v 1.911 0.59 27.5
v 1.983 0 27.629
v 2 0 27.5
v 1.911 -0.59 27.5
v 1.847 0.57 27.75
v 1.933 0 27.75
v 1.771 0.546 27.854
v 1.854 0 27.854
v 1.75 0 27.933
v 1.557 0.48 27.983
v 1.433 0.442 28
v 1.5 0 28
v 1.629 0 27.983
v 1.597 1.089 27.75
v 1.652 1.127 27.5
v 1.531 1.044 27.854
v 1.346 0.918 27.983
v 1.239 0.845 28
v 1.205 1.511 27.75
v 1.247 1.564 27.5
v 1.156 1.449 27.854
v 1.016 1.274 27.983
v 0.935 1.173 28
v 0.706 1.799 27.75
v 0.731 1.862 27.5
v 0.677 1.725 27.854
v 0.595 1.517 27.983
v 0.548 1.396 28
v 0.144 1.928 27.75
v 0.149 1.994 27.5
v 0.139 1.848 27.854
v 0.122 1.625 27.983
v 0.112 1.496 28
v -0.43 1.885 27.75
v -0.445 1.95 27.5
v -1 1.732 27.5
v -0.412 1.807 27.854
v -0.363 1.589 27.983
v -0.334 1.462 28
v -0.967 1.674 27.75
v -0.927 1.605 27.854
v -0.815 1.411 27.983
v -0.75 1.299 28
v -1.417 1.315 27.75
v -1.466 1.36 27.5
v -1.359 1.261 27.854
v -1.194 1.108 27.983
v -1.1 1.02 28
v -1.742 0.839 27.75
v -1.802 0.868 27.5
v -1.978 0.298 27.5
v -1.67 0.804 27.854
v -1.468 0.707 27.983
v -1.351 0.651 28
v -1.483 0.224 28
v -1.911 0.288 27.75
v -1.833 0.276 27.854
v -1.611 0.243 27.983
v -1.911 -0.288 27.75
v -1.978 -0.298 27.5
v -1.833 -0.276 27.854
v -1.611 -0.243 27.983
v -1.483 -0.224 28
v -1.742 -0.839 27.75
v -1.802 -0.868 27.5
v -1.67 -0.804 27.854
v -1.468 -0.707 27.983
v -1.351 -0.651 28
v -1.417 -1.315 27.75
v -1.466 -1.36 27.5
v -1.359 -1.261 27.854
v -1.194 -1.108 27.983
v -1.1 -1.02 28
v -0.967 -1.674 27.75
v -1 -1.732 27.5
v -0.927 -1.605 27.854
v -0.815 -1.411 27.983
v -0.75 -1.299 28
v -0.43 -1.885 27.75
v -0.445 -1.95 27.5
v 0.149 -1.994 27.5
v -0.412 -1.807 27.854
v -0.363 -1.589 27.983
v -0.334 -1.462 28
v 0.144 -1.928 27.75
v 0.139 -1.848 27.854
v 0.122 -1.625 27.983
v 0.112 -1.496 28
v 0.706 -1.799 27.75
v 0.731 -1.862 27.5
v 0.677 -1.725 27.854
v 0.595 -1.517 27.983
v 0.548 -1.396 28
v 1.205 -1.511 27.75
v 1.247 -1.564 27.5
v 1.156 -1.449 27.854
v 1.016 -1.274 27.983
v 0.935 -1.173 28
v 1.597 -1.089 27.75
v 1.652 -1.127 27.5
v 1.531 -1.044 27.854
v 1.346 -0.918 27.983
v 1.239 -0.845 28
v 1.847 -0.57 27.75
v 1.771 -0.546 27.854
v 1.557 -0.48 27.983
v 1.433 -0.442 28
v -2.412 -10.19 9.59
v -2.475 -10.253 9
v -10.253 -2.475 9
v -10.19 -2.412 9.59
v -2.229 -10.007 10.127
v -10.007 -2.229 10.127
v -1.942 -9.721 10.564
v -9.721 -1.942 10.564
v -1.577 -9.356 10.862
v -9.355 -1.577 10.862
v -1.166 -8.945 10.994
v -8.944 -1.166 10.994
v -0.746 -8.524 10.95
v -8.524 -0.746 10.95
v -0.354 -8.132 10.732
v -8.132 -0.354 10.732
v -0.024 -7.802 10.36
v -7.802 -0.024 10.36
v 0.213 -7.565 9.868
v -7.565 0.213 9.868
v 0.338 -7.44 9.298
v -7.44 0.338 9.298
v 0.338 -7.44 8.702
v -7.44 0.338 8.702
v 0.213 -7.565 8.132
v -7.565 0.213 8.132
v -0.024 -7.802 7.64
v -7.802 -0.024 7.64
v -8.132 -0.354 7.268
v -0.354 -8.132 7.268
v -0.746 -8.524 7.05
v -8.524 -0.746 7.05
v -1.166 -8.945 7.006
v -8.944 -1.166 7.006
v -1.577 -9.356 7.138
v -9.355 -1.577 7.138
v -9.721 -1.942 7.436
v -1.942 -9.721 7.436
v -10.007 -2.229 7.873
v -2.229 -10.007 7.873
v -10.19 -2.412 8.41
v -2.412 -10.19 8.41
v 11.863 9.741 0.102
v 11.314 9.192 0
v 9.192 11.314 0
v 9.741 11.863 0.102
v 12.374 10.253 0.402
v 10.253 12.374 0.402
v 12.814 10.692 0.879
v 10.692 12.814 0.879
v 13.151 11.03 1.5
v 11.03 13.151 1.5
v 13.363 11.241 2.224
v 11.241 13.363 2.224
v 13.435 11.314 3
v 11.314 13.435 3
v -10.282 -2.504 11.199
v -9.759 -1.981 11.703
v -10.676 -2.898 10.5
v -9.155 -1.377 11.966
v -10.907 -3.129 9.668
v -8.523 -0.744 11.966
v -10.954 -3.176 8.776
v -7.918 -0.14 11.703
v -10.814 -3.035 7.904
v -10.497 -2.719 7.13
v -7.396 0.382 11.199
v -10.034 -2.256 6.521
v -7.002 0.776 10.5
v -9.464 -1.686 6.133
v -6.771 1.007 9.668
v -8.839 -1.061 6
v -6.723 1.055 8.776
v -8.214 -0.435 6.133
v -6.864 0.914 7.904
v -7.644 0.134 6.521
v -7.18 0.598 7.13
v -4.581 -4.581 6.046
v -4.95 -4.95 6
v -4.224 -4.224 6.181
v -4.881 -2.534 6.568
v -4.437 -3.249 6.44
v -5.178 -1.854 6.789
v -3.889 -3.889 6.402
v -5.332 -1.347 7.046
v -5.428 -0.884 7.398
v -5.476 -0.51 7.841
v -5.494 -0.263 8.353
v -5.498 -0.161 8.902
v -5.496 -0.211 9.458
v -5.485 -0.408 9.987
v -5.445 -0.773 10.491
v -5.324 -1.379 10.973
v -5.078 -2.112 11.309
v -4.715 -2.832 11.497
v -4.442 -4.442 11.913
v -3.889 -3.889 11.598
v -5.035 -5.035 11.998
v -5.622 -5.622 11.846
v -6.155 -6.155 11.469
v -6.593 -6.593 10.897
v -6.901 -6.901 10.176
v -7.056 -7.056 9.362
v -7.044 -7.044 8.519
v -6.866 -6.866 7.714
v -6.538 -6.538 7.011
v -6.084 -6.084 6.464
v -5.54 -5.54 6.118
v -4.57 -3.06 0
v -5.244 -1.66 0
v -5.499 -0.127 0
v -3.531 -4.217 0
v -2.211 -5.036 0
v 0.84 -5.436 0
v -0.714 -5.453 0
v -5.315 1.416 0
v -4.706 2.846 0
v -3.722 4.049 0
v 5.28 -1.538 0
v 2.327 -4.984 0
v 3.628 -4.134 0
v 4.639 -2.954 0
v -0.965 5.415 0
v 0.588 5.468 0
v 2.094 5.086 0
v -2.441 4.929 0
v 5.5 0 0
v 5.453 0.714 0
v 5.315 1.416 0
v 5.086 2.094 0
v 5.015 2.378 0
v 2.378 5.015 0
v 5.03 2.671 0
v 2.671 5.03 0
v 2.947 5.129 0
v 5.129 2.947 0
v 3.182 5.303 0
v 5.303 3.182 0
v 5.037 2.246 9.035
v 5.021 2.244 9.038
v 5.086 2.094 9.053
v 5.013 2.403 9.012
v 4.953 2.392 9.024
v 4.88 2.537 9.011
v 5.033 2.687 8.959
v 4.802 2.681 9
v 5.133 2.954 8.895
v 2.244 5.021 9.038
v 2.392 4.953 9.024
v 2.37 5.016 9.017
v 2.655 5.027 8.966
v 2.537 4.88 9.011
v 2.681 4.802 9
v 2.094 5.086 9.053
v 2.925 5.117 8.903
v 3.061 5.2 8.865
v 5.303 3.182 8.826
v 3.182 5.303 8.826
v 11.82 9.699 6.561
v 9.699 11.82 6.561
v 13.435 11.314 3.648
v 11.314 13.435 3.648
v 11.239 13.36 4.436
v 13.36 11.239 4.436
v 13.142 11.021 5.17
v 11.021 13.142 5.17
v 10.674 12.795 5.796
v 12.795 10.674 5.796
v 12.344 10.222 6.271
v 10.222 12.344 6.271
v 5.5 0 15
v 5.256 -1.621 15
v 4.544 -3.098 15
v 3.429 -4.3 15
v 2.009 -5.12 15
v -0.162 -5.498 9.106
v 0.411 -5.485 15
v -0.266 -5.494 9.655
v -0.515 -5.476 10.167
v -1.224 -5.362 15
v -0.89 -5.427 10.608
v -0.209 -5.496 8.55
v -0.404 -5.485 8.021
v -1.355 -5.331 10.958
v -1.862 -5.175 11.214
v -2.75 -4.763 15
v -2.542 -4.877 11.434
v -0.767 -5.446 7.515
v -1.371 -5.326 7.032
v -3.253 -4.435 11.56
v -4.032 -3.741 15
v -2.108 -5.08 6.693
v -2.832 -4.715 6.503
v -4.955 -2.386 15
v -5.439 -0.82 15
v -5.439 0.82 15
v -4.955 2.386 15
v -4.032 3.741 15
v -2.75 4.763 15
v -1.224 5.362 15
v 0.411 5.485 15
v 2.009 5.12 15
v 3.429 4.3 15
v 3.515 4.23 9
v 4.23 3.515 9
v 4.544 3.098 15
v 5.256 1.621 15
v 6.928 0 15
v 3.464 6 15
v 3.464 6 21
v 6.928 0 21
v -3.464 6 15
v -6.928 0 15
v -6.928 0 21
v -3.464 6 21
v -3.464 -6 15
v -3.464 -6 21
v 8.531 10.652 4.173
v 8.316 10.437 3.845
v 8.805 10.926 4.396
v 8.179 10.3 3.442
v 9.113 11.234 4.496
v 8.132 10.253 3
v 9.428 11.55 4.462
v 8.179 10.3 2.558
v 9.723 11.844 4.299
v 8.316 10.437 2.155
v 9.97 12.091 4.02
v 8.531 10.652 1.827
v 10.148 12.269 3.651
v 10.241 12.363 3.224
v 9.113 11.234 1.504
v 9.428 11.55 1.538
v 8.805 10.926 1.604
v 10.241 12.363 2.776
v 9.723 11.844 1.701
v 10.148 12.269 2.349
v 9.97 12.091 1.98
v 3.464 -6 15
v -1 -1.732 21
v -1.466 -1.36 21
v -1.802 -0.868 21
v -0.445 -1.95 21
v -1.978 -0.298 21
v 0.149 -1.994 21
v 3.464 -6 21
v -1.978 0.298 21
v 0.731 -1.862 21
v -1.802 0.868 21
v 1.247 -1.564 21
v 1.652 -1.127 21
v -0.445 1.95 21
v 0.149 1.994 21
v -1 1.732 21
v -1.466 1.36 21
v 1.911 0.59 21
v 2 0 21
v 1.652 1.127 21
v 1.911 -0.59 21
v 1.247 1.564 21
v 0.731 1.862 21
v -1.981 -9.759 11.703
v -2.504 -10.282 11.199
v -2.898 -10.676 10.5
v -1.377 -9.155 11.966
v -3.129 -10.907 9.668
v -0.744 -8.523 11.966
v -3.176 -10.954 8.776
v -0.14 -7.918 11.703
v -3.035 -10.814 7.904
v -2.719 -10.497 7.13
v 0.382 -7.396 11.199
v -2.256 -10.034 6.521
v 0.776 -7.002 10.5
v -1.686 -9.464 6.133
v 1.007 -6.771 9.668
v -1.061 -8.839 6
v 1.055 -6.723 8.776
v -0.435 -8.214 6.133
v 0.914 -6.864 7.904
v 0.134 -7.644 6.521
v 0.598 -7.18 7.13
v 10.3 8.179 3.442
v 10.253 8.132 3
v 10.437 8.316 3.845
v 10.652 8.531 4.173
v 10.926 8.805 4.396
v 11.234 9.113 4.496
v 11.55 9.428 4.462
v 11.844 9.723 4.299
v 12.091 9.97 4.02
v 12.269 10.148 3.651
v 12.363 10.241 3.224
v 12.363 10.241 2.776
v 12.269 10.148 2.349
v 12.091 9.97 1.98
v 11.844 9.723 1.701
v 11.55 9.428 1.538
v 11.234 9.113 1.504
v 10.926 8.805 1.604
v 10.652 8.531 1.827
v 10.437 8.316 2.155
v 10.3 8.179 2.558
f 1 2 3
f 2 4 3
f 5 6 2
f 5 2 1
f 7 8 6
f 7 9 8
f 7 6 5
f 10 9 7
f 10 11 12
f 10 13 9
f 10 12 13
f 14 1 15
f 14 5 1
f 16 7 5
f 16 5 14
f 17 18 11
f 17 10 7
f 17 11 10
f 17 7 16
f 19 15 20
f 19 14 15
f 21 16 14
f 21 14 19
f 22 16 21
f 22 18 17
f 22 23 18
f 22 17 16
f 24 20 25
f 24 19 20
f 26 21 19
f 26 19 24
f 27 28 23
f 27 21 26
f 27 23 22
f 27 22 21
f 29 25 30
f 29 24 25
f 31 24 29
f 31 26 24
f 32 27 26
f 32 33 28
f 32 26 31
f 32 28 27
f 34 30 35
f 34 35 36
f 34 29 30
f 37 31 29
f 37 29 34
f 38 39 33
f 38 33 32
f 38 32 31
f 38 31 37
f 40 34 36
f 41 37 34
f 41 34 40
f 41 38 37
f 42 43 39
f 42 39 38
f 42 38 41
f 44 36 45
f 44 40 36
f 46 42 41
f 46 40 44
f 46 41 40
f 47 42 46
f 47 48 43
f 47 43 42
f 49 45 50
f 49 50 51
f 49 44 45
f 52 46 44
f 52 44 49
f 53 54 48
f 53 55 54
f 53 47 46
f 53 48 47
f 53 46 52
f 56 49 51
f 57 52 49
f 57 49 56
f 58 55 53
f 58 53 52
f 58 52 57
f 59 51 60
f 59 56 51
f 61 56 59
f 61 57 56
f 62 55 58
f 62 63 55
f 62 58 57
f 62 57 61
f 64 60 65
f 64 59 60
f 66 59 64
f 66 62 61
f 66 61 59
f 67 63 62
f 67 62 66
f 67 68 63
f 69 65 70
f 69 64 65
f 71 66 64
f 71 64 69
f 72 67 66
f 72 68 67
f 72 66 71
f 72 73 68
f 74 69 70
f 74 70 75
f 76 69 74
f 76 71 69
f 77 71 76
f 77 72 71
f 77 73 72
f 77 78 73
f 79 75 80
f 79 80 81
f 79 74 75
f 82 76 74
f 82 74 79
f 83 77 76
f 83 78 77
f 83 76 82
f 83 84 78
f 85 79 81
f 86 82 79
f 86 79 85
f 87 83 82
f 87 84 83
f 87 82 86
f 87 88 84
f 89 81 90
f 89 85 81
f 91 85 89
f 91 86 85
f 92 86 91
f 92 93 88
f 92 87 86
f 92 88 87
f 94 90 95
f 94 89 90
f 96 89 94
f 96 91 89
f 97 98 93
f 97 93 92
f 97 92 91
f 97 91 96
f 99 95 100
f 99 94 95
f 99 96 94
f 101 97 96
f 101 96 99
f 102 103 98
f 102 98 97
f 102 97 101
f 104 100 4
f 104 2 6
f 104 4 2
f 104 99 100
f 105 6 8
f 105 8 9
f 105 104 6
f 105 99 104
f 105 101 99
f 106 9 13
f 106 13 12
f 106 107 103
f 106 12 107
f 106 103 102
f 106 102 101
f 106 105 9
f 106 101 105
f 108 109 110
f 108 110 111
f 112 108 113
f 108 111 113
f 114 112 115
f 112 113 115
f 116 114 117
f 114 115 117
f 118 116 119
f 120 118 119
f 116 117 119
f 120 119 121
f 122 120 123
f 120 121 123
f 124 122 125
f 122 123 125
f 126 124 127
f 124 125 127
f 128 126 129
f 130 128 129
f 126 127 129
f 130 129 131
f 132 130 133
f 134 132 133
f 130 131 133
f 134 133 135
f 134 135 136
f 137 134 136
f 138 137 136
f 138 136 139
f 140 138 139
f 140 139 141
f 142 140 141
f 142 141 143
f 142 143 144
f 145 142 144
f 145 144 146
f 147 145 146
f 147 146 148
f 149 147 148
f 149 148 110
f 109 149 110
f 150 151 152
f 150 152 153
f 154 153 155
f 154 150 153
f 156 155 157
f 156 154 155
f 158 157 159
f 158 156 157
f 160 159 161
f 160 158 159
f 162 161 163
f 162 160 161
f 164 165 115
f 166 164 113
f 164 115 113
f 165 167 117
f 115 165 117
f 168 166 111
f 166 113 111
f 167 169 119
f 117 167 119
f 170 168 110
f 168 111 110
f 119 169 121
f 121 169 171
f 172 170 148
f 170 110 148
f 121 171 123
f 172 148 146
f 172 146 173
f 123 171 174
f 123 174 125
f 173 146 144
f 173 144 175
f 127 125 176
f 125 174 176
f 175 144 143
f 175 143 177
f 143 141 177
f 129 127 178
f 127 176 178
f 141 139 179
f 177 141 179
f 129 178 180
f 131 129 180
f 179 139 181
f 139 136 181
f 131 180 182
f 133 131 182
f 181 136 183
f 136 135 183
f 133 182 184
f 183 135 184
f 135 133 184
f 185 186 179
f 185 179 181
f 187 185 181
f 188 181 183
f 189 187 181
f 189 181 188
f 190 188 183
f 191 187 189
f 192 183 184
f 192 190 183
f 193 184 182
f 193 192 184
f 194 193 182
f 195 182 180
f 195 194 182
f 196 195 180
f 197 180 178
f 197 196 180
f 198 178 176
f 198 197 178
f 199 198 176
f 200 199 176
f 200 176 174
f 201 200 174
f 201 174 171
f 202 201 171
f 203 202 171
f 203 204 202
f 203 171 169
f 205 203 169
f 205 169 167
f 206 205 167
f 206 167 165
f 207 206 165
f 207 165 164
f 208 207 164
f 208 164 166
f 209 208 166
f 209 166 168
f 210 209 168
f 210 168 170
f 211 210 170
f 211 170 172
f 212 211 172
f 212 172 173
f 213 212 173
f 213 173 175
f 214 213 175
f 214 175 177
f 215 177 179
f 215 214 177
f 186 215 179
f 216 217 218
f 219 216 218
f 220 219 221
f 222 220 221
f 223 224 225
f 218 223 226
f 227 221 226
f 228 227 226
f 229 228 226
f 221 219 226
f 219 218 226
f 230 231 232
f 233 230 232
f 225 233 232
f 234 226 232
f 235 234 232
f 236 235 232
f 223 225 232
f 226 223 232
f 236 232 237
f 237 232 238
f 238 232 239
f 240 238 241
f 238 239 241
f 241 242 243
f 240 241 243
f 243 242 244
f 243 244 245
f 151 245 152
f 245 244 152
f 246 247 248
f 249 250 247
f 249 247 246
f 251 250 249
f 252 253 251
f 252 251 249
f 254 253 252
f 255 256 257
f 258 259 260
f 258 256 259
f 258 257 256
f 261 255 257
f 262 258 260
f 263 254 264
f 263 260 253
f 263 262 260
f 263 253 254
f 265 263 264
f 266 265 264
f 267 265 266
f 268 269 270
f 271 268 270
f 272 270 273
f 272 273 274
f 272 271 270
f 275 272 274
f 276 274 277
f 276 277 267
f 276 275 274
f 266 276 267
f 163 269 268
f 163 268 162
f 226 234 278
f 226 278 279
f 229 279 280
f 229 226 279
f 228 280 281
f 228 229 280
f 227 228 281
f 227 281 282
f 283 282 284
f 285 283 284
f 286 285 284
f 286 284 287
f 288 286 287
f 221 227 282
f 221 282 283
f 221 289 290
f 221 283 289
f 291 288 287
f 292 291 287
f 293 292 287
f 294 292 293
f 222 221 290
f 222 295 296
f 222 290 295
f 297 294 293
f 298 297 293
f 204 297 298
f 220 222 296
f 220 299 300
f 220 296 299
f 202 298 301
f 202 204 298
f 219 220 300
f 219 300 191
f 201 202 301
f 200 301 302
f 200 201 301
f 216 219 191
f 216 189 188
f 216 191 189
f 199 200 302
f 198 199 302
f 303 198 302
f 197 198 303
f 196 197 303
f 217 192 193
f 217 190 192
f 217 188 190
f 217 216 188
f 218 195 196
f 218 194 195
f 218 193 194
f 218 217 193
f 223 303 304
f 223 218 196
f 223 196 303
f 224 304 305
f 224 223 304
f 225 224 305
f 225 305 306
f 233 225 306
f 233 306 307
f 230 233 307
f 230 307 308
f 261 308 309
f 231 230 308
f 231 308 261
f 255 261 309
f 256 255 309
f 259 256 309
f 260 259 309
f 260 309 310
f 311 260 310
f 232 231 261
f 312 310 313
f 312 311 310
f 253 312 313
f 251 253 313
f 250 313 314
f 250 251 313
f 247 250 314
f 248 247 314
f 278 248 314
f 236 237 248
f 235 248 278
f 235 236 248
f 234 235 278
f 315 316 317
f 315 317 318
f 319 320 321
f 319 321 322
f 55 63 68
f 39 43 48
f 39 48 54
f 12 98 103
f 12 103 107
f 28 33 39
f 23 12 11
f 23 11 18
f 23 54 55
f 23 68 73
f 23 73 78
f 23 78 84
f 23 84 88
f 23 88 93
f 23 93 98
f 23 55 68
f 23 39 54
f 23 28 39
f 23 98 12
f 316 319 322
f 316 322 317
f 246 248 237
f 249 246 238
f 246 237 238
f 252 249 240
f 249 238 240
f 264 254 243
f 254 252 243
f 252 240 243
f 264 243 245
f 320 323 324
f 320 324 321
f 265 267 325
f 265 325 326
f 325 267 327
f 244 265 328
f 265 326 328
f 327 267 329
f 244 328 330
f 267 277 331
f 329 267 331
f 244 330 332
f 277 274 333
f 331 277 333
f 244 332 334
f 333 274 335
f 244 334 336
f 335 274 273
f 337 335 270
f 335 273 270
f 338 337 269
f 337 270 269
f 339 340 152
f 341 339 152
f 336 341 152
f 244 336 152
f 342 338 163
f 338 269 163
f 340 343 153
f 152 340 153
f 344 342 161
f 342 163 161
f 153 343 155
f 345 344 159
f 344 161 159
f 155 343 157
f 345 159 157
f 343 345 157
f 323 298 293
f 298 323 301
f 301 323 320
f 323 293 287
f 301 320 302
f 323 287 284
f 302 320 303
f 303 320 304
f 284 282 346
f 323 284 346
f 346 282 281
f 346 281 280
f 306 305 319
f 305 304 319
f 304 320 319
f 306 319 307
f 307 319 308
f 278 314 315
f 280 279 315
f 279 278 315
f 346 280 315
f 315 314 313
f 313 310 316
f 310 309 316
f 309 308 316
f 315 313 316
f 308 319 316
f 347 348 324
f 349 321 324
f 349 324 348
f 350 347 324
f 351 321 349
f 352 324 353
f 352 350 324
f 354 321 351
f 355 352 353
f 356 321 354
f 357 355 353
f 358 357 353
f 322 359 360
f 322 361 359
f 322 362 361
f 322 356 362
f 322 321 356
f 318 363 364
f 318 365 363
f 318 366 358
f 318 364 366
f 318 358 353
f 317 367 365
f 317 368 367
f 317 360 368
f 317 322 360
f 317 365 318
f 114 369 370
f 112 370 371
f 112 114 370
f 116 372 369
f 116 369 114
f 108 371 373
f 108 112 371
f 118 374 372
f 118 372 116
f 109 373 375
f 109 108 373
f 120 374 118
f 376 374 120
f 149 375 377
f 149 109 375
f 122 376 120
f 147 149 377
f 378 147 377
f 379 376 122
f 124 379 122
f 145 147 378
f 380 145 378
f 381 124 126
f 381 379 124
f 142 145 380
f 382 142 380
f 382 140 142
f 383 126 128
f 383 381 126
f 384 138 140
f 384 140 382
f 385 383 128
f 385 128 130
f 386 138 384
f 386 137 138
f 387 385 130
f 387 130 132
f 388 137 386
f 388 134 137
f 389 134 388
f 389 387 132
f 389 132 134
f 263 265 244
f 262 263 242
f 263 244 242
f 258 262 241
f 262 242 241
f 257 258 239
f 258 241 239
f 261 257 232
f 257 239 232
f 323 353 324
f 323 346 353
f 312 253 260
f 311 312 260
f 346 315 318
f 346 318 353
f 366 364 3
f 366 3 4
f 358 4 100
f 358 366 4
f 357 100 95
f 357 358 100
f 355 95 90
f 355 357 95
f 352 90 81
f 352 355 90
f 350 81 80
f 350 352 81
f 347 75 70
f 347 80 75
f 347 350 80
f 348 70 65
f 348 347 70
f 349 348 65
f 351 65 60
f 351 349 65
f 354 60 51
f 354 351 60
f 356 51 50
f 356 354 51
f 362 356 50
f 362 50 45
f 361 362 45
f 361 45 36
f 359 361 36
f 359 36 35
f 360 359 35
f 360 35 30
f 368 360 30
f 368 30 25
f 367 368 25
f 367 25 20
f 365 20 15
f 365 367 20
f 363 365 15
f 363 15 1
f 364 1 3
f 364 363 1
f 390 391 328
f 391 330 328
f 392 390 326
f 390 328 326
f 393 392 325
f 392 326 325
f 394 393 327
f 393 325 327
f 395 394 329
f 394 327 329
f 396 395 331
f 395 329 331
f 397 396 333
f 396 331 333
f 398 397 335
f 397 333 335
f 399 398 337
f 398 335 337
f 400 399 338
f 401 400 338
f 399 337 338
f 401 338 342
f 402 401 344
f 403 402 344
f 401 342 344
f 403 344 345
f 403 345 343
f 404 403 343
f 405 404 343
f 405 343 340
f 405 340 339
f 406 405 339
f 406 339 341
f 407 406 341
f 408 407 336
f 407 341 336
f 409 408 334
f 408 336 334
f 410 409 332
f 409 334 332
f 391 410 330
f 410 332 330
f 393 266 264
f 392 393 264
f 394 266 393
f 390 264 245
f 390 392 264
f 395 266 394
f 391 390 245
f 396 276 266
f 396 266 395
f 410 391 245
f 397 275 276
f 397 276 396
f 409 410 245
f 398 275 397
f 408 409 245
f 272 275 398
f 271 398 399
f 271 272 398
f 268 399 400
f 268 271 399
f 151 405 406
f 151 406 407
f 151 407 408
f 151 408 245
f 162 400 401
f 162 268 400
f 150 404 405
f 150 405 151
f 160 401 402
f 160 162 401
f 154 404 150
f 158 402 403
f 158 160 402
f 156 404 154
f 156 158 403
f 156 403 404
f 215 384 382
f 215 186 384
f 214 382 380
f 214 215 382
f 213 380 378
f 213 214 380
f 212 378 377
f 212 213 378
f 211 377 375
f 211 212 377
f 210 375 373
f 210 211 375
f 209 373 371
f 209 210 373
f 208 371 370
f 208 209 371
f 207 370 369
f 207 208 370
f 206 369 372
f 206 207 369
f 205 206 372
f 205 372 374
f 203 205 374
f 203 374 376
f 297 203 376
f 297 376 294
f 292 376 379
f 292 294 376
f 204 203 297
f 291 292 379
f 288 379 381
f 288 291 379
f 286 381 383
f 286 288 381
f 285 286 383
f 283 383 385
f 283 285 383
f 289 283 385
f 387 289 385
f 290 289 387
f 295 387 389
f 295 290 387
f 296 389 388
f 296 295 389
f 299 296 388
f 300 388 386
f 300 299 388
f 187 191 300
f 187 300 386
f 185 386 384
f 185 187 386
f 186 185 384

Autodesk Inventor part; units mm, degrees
ref_plane "XY Plane" through (0, 0, 0) normal (0, 0, 1) x (1, 0, 0)
sketch "Esquisse1" plane through (0, 0, 0) normal (0, 0, 1) x (1, 0, 0)
  circle A0 centre (0, 0) radius 5.5
  dimension "d0" = 11
extrude "Extrusion1" add sketch "Esquisse1" along normal blind 15
ref_plane "Plan de construction1" through (0, 0, 0) normal (0.7071068, -0.7071068, 0) x (0, 0, -1)
sketch "Esquisse3" plane through (0, 0, 0) normal (0.7071068, -0.7071068, 0) x (0, 0, -1)
  circle A0 centre (-9, -7) radius 3
  line L0 (-15, 5.5) -> (-15, -5.5) projected
  line L1 (0, -5.5) -> (0, 5.5) projected
  point P0 (0, 0)
  dimension "d3" = 6
  dimension "d4" = 7
  dimension "d5" = 15
  dimension "d6" = 9
extrude "Extrusion2" add sketch "Esquisse3" along normal mid plane 11
sketch "Esquisse4" plane through (-8.8388, -1.0607, 9) normal (-0.7071068, 0.7071068, 0) x (-0.7071068, -0.7071068, 0)
  circle A0 centre (0, 0) radius 2
  point P0 (-7, -9)
  dimension "d9" = 4
extrude "Extrusion3" cut sketch "Esquisse4" against normal through all
sketch "Esquisse5" plane through (0, 0, 15) normal (0, 0, 1) x (1, 0, 0)
  line L0 (-6.9282, 0) -> (-3.4641, 6)
  line L1 (-3.4641, 6) -> (3.4641, 6)
  line L2 (3.4641, 6) -> (6.9282, 0)
  line L3 (6.9282, 0) -> (3.4641, -6)
  line L4 (3.4641, -6) -> (-3.4641, -6)
  line L5 (-3.4641, -6) -> (-6.9282, 0)
  point P0 (0, 0)
  point P1 (0, 0)
  dimension "d12" = 12
extrude "Extrusion4" add sketch "Esquisse5" along normal blind 6
sketch "Esquisse6" plane through (0, 0, 21) normal (0, 0, 1) x (1, 0, 0)
  circle A0 centre (0, 0) radius 2
  dimension "d15" = 4
extrude "Extrusion5" add sketch "Esquisse6" along normal blind 7
thread "Filetage1" size "M4x0.7" class "6g" standard "ANSI Metric M Profile" full length
fillet "Congé1" radius 0.5 1 edges at (-2, 0, 28)
sketch "Esquisse8" plane through (0, 0, 0) normal (0.7071068, -0.7071068, 0) x (0, 0, -1)
  line L0 (0, -5.5) -> (0, 5.5) projected
  line L1 (0, 3.5) -> (-9, 3.5)
  line L2 (-9, 3.5) -> (-9, 17.5)
  line L3 (-9, 17.5) -> (0, 17.5)
  line L4 (0, 17.5) -> (0, 3.5)
  point P0 (0, 0)
  dimension "d21" = 3.5
  dimension "d22" = 14
  dimension "d23" = 9
extrude "Extrusion6" add sketch "Esquisse8" along normal mid plane 3
sketch "Esquisse9" plane through (-1.0607, 1.0607, 0) normal (-0.7071068, 0.7071068, 0) x (-0.7071068, -0.7071068, 0)
  line L0 (-5.2915, 9) -> (-5.2915, 0) projected
  line L1 (-5.2915, 9) -> (-17.5, 6)
  line L2 (-17.5, 9) -> (-17.5, 0) projected
  line L3 (-5.2915, 9) -> (-17.5, 9) projected
  line L4 (-17.5, 9) -> (-5.2915, 9)
  point P0 (0, 0)
  dimension "d26" = 6
extrude "Extrusion7" cut sketch "Esquisse9" against normal blind 3
sketch "Esquisse10" plane through (-1.0607, 1.0607, 0) normal (-0.7071068, 0.7071068, 0) x (-0.7071068, -0.7071068, 0)
  circle A0 centre (-14.5, 3) radius 1.5
  line L0 (-17.5, 0) -> (-5.2915, 0) projected
  line L1 (-17.5, 6) -> (-17.5, 0) projected
  point P0 (0, 0)
  dimension "d29" = 3
  dimension "d30" = 3
  dimension "d31" = 3
extrude "Extrusion8" cut sketch "Esquisse10" against normal through all
fillet "Congé2" radius 3 2 edges at (12.3744, 12.3744, 0) (12.3744, 12.3744, 6)
fillet "Congé3" radius 1 2 edges at (2.681, 4.8023, 4.5) (4.8023, 2.681, 4.5)
properties part number "Fusée" material "Acier inoxydable"
